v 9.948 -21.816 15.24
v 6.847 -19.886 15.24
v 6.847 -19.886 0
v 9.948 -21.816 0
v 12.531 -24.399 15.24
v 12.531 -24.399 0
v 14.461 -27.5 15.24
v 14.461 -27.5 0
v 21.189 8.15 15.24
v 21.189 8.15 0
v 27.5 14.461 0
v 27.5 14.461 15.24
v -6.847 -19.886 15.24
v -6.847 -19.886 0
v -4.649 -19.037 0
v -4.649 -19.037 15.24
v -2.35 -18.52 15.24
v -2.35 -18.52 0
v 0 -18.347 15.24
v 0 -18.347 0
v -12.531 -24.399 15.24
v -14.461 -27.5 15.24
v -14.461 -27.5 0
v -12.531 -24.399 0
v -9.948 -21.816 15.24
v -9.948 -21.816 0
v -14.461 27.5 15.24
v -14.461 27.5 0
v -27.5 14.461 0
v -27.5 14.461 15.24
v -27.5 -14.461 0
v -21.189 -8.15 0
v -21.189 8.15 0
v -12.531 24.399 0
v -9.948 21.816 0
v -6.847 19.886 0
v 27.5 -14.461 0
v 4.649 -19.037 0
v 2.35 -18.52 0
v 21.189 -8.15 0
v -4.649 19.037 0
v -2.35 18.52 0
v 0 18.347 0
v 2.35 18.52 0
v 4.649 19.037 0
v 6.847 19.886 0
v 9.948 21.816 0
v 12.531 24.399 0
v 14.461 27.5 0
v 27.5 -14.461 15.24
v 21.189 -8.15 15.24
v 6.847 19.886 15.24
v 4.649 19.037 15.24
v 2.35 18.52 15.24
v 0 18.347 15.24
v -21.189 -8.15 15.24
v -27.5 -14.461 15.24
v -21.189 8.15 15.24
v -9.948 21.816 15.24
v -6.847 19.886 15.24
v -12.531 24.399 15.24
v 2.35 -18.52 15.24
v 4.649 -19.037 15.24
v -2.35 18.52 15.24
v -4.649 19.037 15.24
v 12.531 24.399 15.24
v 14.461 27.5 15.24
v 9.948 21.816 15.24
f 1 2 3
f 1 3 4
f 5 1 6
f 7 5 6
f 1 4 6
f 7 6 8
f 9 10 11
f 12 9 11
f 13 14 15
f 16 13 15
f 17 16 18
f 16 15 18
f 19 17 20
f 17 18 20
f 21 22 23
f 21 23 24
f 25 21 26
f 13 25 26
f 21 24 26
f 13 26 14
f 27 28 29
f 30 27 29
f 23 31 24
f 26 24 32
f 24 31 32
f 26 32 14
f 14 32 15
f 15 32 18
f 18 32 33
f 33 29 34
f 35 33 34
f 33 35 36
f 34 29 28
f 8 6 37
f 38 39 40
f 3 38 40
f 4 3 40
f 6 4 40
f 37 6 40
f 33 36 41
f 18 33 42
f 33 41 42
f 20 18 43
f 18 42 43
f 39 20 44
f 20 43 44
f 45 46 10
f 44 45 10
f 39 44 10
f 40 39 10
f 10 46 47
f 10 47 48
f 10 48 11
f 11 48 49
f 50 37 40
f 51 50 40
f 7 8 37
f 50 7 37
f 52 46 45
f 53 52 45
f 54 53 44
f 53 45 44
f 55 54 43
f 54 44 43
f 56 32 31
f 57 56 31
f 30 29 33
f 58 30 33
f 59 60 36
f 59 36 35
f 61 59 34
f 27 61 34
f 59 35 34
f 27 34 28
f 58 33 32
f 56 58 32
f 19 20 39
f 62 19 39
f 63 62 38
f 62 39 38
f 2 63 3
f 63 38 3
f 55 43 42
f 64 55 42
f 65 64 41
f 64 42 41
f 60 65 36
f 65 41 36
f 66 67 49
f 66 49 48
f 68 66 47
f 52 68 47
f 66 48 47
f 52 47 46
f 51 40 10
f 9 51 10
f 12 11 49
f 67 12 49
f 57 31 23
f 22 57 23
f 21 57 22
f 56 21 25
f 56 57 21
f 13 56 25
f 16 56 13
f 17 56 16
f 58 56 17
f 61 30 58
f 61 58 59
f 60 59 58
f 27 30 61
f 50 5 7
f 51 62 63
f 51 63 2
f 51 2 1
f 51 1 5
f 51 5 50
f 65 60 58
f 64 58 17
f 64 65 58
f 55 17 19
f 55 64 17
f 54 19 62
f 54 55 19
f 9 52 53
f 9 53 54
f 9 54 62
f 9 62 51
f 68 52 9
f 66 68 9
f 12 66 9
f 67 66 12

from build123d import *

# Parameters (mm, degrees)
F1_DEPTH = 15.24


# Not quite as in the source:
# - a feature names something its author has since deleted; it is built from what else it names


with BuildPart() as f1:
    # F0 (on Top) → F1 (new body)
    with BuildSketch(Plane.XY):
        with BuildLine():
            ThreePointArc((-6.8469626463, 19.8860116913), (-11.313708499, 23.0332541473), (-14.4609509549, 27.5))
            Line((-14.4609509549, 27.5), (-27.5, 14.4609509549))
            Line((-27.5, 14.4609509549), (-21.1890490451, 8.15))
            Line((-21.1890490451, 8.15), (-13.0390490451, 0))
            Line((-13.0390490451, 0), (0, 13.0390490451))
            Line((0, 13.0390490451), (-6.8469626463, 19.8860116913))
        make_face()
        Polygon((-13.0390490451, 0), (-21.1890490451, 8.15), (-21.1890490451, -8.15), align=None)
        with BuildLine():
            Line((14.4609509549, -27.5), (27.5, -14.4609509549))
            Line((27.5, -14.4609509549), (21.1890490451, -8.15))
            Line((21.1890490451, -8.15), (13.0390490451, 0))
            Line((13.0390490451, 0), (0, -13.0390490451))
            Line((0, -13.0390490451), (6.8469626463, -19.8860116913))
            ThreePointArc((6.8469626463, -19.8860116913), (11.313708499, -23.0332541473), (14.4609509549, -27.5))
        make_face()
        Polygon((13.0390490451, 0), (0, 13.0390490451), (0, 0), (0, -13.0390490451), align=None)
        Polygon((0, 0), (0, 13.0390490451), (-13.0390490451, 0), (0, -13.0390490451), align=None)
        with BuildLine():
            Line((27.5, 14.4609509549), (14.4609509549, 27.5))
            ThreePointArc((14.4609509549, 27.5), (11.313708499, 23.0332541473), (6.8469626463, 19.8860116913))
            Line((6.8469626463, 19.8860116913), (0, 13.0390490451))
            Line((0, 13.0390490451), (13.0390490451, 0))
            Line((13.0390490451, 0), (21.1890490451, 8.15))
            Line((21.1890490451, 8.15), (27.5, 14.4609509549))
        make_face()
        Polygon((21.1890490451, -8.15), (21.1890490451, 8.15), (13.0390490451, 0), align=None)
        with BuildLine():
            Line((0, -13.0390490451), (-6.8469626463, -19.8860116913))
            ThreePointArc((-6.8469626463, -19.8860116913), (-3.5089018739, -18.7364659329), (0, -18.3469626463))
            Line((0, -18.3469626463), (0, -13.0390490451))
        make_face()
        with BuildLine():
            Line((0, 13.0390490451), (6.8469626463, 19.8860116913))
            ThreePointArc((6.8469626463, 19.8860116913), (3.5089018739, 18.7364659329), (0, 18.3469626463))
            Line((0, 18.3469626463), (0, 13.0390490451))
        make_face()
        with BuildLine():
            ThreePointArc((0, 18.3469626463), (-3.5089018739, 18.7364659329), (-6.8469626463, 19.8860116913))
            Line((-6.8469626463, 19.8860116913), (0, 13.0390490451))
            Line((0, 13.0390490451), (0, 18.3469626463))
        make_face()
        with BuildLine():
            Line((6.8469626463, -19.8860116913), (0, -13.0390490451))
            Line((0, -13.0390490451), (0, -18.3469626463))
            ThreePointArc((0, -18.3469626463), (3.5089018739, -18.7364659329), (6.8469626463, -19.8860116913))
        make_face()
        with BuildLine():
            Line((-21.1890490451, -8.15), (-27.5, -14.4609509549))
            Line((-27.5, -14.4609509549), (-14.4609509549, -27.5))
            ThreePointArc((-14.4609509549, -27.5), (-11.313708499, -23.0332541473), (-6.8469626463, -19.8860116913))
            Line((-6.8469626463, -19.8860116913), (0, -13.0390490451))
            Line((0, -13.0390490451), (-13.0390490451, 0))
            Line((-13.0390490451, 0), (-21.1890490451, -8.15))
        make_face()
    extrude(amount=F1_DEPTH)


solid = f1.part
